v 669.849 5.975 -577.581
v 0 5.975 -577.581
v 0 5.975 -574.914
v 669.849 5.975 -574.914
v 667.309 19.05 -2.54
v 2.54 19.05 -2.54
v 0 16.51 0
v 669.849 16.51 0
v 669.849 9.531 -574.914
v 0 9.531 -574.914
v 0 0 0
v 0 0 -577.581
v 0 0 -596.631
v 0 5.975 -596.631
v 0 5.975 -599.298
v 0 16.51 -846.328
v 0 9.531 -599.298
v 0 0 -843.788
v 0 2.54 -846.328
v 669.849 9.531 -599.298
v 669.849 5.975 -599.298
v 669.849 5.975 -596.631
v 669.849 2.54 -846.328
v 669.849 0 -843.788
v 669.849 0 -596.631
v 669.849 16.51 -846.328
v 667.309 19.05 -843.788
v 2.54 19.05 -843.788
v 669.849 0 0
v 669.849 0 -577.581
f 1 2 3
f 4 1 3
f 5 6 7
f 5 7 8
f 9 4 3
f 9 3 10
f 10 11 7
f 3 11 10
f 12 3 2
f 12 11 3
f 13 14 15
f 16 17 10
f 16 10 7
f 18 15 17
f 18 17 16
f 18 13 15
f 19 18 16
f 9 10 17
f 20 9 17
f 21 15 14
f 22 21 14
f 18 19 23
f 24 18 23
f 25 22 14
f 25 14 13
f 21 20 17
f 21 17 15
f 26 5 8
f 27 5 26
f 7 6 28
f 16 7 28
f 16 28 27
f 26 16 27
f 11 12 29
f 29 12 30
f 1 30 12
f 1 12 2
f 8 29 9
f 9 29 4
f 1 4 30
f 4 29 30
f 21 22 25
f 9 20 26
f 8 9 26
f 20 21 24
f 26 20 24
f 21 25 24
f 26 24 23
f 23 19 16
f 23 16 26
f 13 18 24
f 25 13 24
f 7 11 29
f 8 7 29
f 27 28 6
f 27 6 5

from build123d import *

# Parameters (mm, degrees)
SKETCH1_W           = 669.8488
SKETCH1_H           = 846.328
BOSS_EXTRUDE1_DEPTH = 19.05
CHAMFER1_SIZE       = 2.54
CHAMFER2_SIZE       = 2.54
CUT_EXTRUDE2_DEPTH  = 670.8488


with BuildPart() as part:
    # Sketch1 → Boss-Extrude1 (new body)
    with BuildSketch(Plane(origin=(0, 0, 0), x_dir=(1, 0, 0), z_dir=(0, 1, 0))):
        with Locations((334.9244, 423.164)):
            Rectangle(SKETCH1_W, SKETCH1_H)
    extrude(amount=BOSS_EXTRUDE1_DEPTH)

    # Chamfer1
    chamfer1_edges = [part.edges().sort_by_distance(p)[0] for p in [
        (669.8488, 19.05, -423.164),
        (334.9244, 19.05, -846.328),
        (0, 19.05, -423.164),
        (334.9244, 19.05, 0),
    ]]
    chamfer(chamfer1_edges, length=CHAMFER1_SIZE)

    # Chamfer2
    chamfer2_edges = [part.edges().sort_by_distance(p)[0] for p in [
        (334.9244, 0, -846.328),
    ]]
    chamfer(chamfer2_edges, length=CHAMFER2_SIZE)

    # Sketch3 → Cut-Extrude2 (cut, through all)
    with BuildSketch(Plane.ZY):
        Polygon((-596.63076, 5.97535), (-596.63076, 0), (-577.58076, 0), (-577.58076, 5.97535), (-574.91376, 5.97535), (-574.91376, 9.53135), (-599.29776, 9.53135), (-599.29776, 5.97535), align=None)
    extrude(amount=-CUT_EXTRUDE2_DEPTH, mode=Mode.SUBTRACT)


solid = part.part
